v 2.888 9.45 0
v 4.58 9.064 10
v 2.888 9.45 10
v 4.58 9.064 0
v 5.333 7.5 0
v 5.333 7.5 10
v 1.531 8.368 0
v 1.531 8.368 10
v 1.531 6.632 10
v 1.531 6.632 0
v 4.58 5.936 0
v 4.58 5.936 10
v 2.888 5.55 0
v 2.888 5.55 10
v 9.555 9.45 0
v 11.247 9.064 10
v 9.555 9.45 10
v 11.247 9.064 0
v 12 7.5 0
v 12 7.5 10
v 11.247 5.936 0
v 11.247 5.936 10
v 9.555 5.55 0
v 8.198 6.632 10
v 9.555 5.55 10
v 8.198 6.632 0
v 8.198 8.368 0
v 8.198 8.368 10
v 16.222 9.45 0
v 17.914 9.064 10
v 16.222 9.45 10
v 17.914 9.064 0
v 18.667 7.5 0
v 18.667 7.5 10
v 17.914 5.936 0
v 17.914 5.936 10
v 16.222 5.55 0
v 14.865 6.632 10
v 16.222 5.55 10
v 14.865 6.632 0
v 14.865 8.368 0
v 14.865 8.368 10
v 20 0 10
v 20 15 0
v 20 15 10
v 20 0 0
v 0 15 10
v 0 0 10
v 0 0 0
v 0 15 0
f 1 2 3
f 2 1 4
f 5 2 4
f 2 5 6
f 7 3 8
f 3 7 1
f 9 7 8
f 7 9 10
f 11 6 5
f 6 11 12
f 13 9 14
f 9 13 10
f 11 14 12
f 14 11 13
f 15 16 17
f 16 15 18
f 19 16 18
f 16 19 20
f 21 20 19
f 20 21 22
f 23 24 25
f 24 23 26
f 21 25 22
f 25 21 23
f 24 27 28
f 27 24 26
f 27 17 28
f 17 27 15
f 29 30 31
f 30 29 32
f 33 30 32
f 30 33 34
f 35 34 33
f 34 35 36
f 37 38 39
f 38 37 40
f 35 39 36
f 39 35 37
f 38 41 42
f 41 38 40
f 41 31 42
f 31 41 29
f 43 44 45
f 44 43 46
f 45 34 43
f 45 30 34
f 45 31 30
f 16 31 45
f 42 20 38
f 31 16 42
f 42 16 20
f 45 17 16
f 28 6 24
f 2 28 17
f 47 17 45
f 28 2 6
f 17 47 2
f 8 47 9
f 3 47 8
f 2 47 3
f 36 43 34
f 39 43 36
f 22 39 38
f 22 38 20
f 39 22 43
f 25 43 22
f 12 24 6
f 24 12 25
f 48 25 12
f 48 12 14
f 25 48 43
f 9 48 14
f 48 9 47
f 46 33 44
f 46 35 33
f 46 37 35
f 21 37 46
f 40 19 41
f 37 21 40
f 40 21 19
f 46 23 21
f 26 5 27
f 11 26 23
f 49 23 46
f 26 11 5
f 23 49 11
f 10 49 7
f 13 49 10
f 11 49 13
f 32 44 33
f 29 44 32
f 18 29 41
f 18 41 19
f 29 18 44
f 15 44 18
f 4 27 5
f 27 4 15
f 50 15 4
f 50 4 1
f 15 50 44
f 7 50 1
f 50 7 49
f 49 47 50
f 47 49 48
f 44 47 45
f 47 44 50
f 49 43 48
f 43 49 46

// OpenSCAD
// exercises -D overrides
width  = 20;
height = 10;
holes  = 3;
difference() {
    cube([width, 15, height]);
    for (i = [0 : holes - 1])
        translate([width * (i + 0.5) / holes, 7.5, -1])
            cylinder(h = height + 2, r = 2);
}
